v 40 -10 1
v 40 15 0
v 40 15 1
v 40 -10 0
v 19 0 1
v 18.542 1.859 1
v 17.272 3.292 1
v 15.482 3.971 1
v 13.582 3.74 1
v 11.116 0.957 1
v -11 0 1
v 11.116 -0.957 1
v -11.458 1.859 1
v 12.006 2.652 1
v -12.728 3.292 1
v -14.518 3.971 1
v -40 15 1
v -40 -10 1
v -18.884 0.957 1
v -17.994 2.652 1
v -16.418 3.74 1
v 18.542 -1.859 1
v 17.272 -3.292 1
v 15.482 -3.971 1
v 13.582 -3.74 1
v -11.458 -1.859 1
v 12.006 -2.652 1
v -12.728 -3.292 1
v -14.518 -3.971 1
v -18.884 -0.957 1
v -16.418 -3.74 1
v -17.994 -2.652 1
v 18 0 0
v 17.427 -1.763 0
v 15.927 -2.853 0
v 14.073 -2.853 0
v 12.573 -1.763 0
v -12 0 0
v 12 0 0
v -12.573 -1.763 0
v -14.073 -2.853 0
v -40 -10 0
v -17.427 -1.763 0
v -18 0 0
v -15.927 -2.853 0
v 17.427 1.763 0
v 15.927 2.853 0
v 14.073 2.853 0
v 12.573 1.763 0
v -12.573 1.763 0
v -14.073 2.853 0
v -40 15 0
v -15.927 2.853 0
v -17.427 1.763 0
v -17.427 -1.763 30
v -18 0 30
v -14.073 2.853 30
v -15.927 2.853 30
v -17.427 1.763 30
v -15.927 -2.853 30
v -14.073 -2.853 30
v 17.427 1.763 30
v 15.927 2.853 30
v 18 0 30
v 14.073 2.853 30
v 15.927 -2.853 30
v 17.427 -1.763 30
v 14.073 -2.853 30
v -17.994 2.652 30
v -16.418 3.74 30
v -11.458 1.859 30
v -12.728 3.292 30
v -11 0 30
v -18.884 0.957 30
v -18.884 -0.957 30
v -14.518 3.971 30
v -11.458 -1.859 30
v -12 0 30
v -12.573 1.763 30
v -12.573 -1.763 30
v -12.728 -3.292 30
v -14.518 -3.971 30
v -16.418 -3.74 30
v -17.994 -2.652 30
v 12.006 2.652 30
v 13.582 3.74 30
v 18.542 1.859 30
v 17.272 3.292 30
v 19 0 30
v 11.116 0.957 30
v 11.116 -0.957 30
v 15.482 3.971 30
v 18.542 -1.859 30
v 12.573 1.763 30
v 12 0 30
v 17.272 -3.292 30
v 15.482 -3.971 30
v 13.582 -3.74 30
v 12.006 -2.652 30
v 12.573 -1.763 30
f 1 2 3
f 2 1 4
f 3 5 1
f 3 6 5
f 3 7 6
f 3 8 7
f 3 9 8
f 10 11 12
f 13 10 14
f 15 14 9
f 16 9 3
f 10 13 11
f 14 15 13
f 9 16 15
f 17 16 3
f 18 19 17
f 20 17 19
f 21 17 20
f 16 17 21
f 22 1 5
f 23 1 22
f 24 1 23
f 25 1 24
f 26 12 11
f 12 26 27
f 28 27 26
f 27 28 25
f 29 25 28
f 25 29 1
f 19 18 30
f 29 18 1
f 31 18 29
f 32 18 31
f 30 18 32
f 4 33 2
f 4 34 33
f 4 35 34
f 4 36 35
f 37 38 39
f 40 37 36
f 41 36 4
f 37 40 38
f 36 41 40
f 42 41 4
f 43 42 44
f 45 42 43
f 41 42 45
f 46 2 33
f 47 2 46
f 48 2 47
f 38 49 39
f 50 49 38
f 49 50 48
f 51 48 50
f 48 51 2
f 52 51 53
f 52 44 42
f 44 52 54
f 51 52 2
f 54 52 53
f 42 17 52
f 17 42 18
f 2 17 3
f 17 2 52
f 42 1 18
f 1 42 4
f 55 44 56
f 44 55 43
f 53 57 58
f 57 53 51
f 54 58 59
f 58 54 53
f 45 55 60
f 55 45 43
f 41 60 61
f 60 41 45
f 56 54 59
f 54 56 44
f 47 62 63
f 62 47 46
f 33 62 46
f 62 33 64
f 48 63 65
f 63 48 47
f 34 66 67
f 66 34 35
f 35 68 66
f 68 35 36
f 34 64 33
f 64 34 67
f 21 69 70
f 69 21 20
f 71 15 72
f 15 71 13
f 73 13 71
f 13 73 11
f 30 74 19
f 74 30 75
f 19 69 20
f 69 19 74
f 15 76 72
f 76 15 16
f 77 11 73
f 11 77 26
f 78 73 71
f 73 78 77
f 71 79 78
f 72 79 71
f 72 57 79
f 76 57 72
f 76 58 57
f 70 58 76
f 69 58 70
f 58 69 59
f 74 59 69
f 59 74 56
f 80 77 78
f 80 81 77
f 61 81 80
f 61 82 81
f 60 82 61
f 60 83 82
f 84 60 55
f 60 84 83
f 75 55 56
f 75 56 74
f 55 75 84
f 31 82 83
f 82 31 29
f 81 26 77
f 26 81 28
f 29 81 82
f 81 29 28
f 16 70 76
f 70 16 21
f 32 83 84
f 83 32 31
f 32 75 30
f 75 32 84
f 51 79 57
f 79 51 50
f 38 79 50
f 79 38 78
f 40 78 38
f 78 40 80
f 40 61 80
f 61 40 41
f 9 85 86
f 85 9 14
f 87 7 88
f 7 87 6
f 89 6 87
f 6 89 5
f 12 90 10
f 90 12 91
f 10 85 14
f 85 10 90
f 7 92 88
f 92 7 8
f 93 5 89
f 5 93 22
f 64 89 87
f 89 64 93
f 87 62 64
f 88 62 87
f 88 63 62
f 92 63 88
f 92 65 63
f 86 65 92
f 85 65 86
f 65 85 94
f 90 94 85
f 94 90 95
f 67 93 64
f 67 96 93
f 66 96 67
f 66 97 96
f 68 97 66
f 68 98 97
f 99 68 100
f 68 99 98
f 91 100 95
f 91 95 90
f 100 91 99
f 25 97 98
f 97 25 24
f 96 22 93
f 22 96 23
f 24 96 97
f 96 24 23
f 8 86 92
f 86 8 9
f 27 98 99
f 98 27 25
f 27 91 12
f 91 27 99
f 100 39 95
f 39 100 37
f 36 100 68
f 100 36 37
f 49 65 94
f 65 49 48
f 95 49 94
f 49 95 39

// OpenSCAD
difference() {
translate([-40,-10,0]) cube([80,25,1]);
    {
    translate([-15,0,0]) cylinder(r=3, h=1);
    translate([15,0,0]) cylinder(r=3, h=1);
    }
}

translate([-15,0,0])
difference() 
{
    cylinder(r=4,h=30);
    cylinder(r=3, h=30);
}
translate([15,0,0])
difference() 
{
    cylinder(r=4,h=30);
    cylinder(r=3, h=30);
}
